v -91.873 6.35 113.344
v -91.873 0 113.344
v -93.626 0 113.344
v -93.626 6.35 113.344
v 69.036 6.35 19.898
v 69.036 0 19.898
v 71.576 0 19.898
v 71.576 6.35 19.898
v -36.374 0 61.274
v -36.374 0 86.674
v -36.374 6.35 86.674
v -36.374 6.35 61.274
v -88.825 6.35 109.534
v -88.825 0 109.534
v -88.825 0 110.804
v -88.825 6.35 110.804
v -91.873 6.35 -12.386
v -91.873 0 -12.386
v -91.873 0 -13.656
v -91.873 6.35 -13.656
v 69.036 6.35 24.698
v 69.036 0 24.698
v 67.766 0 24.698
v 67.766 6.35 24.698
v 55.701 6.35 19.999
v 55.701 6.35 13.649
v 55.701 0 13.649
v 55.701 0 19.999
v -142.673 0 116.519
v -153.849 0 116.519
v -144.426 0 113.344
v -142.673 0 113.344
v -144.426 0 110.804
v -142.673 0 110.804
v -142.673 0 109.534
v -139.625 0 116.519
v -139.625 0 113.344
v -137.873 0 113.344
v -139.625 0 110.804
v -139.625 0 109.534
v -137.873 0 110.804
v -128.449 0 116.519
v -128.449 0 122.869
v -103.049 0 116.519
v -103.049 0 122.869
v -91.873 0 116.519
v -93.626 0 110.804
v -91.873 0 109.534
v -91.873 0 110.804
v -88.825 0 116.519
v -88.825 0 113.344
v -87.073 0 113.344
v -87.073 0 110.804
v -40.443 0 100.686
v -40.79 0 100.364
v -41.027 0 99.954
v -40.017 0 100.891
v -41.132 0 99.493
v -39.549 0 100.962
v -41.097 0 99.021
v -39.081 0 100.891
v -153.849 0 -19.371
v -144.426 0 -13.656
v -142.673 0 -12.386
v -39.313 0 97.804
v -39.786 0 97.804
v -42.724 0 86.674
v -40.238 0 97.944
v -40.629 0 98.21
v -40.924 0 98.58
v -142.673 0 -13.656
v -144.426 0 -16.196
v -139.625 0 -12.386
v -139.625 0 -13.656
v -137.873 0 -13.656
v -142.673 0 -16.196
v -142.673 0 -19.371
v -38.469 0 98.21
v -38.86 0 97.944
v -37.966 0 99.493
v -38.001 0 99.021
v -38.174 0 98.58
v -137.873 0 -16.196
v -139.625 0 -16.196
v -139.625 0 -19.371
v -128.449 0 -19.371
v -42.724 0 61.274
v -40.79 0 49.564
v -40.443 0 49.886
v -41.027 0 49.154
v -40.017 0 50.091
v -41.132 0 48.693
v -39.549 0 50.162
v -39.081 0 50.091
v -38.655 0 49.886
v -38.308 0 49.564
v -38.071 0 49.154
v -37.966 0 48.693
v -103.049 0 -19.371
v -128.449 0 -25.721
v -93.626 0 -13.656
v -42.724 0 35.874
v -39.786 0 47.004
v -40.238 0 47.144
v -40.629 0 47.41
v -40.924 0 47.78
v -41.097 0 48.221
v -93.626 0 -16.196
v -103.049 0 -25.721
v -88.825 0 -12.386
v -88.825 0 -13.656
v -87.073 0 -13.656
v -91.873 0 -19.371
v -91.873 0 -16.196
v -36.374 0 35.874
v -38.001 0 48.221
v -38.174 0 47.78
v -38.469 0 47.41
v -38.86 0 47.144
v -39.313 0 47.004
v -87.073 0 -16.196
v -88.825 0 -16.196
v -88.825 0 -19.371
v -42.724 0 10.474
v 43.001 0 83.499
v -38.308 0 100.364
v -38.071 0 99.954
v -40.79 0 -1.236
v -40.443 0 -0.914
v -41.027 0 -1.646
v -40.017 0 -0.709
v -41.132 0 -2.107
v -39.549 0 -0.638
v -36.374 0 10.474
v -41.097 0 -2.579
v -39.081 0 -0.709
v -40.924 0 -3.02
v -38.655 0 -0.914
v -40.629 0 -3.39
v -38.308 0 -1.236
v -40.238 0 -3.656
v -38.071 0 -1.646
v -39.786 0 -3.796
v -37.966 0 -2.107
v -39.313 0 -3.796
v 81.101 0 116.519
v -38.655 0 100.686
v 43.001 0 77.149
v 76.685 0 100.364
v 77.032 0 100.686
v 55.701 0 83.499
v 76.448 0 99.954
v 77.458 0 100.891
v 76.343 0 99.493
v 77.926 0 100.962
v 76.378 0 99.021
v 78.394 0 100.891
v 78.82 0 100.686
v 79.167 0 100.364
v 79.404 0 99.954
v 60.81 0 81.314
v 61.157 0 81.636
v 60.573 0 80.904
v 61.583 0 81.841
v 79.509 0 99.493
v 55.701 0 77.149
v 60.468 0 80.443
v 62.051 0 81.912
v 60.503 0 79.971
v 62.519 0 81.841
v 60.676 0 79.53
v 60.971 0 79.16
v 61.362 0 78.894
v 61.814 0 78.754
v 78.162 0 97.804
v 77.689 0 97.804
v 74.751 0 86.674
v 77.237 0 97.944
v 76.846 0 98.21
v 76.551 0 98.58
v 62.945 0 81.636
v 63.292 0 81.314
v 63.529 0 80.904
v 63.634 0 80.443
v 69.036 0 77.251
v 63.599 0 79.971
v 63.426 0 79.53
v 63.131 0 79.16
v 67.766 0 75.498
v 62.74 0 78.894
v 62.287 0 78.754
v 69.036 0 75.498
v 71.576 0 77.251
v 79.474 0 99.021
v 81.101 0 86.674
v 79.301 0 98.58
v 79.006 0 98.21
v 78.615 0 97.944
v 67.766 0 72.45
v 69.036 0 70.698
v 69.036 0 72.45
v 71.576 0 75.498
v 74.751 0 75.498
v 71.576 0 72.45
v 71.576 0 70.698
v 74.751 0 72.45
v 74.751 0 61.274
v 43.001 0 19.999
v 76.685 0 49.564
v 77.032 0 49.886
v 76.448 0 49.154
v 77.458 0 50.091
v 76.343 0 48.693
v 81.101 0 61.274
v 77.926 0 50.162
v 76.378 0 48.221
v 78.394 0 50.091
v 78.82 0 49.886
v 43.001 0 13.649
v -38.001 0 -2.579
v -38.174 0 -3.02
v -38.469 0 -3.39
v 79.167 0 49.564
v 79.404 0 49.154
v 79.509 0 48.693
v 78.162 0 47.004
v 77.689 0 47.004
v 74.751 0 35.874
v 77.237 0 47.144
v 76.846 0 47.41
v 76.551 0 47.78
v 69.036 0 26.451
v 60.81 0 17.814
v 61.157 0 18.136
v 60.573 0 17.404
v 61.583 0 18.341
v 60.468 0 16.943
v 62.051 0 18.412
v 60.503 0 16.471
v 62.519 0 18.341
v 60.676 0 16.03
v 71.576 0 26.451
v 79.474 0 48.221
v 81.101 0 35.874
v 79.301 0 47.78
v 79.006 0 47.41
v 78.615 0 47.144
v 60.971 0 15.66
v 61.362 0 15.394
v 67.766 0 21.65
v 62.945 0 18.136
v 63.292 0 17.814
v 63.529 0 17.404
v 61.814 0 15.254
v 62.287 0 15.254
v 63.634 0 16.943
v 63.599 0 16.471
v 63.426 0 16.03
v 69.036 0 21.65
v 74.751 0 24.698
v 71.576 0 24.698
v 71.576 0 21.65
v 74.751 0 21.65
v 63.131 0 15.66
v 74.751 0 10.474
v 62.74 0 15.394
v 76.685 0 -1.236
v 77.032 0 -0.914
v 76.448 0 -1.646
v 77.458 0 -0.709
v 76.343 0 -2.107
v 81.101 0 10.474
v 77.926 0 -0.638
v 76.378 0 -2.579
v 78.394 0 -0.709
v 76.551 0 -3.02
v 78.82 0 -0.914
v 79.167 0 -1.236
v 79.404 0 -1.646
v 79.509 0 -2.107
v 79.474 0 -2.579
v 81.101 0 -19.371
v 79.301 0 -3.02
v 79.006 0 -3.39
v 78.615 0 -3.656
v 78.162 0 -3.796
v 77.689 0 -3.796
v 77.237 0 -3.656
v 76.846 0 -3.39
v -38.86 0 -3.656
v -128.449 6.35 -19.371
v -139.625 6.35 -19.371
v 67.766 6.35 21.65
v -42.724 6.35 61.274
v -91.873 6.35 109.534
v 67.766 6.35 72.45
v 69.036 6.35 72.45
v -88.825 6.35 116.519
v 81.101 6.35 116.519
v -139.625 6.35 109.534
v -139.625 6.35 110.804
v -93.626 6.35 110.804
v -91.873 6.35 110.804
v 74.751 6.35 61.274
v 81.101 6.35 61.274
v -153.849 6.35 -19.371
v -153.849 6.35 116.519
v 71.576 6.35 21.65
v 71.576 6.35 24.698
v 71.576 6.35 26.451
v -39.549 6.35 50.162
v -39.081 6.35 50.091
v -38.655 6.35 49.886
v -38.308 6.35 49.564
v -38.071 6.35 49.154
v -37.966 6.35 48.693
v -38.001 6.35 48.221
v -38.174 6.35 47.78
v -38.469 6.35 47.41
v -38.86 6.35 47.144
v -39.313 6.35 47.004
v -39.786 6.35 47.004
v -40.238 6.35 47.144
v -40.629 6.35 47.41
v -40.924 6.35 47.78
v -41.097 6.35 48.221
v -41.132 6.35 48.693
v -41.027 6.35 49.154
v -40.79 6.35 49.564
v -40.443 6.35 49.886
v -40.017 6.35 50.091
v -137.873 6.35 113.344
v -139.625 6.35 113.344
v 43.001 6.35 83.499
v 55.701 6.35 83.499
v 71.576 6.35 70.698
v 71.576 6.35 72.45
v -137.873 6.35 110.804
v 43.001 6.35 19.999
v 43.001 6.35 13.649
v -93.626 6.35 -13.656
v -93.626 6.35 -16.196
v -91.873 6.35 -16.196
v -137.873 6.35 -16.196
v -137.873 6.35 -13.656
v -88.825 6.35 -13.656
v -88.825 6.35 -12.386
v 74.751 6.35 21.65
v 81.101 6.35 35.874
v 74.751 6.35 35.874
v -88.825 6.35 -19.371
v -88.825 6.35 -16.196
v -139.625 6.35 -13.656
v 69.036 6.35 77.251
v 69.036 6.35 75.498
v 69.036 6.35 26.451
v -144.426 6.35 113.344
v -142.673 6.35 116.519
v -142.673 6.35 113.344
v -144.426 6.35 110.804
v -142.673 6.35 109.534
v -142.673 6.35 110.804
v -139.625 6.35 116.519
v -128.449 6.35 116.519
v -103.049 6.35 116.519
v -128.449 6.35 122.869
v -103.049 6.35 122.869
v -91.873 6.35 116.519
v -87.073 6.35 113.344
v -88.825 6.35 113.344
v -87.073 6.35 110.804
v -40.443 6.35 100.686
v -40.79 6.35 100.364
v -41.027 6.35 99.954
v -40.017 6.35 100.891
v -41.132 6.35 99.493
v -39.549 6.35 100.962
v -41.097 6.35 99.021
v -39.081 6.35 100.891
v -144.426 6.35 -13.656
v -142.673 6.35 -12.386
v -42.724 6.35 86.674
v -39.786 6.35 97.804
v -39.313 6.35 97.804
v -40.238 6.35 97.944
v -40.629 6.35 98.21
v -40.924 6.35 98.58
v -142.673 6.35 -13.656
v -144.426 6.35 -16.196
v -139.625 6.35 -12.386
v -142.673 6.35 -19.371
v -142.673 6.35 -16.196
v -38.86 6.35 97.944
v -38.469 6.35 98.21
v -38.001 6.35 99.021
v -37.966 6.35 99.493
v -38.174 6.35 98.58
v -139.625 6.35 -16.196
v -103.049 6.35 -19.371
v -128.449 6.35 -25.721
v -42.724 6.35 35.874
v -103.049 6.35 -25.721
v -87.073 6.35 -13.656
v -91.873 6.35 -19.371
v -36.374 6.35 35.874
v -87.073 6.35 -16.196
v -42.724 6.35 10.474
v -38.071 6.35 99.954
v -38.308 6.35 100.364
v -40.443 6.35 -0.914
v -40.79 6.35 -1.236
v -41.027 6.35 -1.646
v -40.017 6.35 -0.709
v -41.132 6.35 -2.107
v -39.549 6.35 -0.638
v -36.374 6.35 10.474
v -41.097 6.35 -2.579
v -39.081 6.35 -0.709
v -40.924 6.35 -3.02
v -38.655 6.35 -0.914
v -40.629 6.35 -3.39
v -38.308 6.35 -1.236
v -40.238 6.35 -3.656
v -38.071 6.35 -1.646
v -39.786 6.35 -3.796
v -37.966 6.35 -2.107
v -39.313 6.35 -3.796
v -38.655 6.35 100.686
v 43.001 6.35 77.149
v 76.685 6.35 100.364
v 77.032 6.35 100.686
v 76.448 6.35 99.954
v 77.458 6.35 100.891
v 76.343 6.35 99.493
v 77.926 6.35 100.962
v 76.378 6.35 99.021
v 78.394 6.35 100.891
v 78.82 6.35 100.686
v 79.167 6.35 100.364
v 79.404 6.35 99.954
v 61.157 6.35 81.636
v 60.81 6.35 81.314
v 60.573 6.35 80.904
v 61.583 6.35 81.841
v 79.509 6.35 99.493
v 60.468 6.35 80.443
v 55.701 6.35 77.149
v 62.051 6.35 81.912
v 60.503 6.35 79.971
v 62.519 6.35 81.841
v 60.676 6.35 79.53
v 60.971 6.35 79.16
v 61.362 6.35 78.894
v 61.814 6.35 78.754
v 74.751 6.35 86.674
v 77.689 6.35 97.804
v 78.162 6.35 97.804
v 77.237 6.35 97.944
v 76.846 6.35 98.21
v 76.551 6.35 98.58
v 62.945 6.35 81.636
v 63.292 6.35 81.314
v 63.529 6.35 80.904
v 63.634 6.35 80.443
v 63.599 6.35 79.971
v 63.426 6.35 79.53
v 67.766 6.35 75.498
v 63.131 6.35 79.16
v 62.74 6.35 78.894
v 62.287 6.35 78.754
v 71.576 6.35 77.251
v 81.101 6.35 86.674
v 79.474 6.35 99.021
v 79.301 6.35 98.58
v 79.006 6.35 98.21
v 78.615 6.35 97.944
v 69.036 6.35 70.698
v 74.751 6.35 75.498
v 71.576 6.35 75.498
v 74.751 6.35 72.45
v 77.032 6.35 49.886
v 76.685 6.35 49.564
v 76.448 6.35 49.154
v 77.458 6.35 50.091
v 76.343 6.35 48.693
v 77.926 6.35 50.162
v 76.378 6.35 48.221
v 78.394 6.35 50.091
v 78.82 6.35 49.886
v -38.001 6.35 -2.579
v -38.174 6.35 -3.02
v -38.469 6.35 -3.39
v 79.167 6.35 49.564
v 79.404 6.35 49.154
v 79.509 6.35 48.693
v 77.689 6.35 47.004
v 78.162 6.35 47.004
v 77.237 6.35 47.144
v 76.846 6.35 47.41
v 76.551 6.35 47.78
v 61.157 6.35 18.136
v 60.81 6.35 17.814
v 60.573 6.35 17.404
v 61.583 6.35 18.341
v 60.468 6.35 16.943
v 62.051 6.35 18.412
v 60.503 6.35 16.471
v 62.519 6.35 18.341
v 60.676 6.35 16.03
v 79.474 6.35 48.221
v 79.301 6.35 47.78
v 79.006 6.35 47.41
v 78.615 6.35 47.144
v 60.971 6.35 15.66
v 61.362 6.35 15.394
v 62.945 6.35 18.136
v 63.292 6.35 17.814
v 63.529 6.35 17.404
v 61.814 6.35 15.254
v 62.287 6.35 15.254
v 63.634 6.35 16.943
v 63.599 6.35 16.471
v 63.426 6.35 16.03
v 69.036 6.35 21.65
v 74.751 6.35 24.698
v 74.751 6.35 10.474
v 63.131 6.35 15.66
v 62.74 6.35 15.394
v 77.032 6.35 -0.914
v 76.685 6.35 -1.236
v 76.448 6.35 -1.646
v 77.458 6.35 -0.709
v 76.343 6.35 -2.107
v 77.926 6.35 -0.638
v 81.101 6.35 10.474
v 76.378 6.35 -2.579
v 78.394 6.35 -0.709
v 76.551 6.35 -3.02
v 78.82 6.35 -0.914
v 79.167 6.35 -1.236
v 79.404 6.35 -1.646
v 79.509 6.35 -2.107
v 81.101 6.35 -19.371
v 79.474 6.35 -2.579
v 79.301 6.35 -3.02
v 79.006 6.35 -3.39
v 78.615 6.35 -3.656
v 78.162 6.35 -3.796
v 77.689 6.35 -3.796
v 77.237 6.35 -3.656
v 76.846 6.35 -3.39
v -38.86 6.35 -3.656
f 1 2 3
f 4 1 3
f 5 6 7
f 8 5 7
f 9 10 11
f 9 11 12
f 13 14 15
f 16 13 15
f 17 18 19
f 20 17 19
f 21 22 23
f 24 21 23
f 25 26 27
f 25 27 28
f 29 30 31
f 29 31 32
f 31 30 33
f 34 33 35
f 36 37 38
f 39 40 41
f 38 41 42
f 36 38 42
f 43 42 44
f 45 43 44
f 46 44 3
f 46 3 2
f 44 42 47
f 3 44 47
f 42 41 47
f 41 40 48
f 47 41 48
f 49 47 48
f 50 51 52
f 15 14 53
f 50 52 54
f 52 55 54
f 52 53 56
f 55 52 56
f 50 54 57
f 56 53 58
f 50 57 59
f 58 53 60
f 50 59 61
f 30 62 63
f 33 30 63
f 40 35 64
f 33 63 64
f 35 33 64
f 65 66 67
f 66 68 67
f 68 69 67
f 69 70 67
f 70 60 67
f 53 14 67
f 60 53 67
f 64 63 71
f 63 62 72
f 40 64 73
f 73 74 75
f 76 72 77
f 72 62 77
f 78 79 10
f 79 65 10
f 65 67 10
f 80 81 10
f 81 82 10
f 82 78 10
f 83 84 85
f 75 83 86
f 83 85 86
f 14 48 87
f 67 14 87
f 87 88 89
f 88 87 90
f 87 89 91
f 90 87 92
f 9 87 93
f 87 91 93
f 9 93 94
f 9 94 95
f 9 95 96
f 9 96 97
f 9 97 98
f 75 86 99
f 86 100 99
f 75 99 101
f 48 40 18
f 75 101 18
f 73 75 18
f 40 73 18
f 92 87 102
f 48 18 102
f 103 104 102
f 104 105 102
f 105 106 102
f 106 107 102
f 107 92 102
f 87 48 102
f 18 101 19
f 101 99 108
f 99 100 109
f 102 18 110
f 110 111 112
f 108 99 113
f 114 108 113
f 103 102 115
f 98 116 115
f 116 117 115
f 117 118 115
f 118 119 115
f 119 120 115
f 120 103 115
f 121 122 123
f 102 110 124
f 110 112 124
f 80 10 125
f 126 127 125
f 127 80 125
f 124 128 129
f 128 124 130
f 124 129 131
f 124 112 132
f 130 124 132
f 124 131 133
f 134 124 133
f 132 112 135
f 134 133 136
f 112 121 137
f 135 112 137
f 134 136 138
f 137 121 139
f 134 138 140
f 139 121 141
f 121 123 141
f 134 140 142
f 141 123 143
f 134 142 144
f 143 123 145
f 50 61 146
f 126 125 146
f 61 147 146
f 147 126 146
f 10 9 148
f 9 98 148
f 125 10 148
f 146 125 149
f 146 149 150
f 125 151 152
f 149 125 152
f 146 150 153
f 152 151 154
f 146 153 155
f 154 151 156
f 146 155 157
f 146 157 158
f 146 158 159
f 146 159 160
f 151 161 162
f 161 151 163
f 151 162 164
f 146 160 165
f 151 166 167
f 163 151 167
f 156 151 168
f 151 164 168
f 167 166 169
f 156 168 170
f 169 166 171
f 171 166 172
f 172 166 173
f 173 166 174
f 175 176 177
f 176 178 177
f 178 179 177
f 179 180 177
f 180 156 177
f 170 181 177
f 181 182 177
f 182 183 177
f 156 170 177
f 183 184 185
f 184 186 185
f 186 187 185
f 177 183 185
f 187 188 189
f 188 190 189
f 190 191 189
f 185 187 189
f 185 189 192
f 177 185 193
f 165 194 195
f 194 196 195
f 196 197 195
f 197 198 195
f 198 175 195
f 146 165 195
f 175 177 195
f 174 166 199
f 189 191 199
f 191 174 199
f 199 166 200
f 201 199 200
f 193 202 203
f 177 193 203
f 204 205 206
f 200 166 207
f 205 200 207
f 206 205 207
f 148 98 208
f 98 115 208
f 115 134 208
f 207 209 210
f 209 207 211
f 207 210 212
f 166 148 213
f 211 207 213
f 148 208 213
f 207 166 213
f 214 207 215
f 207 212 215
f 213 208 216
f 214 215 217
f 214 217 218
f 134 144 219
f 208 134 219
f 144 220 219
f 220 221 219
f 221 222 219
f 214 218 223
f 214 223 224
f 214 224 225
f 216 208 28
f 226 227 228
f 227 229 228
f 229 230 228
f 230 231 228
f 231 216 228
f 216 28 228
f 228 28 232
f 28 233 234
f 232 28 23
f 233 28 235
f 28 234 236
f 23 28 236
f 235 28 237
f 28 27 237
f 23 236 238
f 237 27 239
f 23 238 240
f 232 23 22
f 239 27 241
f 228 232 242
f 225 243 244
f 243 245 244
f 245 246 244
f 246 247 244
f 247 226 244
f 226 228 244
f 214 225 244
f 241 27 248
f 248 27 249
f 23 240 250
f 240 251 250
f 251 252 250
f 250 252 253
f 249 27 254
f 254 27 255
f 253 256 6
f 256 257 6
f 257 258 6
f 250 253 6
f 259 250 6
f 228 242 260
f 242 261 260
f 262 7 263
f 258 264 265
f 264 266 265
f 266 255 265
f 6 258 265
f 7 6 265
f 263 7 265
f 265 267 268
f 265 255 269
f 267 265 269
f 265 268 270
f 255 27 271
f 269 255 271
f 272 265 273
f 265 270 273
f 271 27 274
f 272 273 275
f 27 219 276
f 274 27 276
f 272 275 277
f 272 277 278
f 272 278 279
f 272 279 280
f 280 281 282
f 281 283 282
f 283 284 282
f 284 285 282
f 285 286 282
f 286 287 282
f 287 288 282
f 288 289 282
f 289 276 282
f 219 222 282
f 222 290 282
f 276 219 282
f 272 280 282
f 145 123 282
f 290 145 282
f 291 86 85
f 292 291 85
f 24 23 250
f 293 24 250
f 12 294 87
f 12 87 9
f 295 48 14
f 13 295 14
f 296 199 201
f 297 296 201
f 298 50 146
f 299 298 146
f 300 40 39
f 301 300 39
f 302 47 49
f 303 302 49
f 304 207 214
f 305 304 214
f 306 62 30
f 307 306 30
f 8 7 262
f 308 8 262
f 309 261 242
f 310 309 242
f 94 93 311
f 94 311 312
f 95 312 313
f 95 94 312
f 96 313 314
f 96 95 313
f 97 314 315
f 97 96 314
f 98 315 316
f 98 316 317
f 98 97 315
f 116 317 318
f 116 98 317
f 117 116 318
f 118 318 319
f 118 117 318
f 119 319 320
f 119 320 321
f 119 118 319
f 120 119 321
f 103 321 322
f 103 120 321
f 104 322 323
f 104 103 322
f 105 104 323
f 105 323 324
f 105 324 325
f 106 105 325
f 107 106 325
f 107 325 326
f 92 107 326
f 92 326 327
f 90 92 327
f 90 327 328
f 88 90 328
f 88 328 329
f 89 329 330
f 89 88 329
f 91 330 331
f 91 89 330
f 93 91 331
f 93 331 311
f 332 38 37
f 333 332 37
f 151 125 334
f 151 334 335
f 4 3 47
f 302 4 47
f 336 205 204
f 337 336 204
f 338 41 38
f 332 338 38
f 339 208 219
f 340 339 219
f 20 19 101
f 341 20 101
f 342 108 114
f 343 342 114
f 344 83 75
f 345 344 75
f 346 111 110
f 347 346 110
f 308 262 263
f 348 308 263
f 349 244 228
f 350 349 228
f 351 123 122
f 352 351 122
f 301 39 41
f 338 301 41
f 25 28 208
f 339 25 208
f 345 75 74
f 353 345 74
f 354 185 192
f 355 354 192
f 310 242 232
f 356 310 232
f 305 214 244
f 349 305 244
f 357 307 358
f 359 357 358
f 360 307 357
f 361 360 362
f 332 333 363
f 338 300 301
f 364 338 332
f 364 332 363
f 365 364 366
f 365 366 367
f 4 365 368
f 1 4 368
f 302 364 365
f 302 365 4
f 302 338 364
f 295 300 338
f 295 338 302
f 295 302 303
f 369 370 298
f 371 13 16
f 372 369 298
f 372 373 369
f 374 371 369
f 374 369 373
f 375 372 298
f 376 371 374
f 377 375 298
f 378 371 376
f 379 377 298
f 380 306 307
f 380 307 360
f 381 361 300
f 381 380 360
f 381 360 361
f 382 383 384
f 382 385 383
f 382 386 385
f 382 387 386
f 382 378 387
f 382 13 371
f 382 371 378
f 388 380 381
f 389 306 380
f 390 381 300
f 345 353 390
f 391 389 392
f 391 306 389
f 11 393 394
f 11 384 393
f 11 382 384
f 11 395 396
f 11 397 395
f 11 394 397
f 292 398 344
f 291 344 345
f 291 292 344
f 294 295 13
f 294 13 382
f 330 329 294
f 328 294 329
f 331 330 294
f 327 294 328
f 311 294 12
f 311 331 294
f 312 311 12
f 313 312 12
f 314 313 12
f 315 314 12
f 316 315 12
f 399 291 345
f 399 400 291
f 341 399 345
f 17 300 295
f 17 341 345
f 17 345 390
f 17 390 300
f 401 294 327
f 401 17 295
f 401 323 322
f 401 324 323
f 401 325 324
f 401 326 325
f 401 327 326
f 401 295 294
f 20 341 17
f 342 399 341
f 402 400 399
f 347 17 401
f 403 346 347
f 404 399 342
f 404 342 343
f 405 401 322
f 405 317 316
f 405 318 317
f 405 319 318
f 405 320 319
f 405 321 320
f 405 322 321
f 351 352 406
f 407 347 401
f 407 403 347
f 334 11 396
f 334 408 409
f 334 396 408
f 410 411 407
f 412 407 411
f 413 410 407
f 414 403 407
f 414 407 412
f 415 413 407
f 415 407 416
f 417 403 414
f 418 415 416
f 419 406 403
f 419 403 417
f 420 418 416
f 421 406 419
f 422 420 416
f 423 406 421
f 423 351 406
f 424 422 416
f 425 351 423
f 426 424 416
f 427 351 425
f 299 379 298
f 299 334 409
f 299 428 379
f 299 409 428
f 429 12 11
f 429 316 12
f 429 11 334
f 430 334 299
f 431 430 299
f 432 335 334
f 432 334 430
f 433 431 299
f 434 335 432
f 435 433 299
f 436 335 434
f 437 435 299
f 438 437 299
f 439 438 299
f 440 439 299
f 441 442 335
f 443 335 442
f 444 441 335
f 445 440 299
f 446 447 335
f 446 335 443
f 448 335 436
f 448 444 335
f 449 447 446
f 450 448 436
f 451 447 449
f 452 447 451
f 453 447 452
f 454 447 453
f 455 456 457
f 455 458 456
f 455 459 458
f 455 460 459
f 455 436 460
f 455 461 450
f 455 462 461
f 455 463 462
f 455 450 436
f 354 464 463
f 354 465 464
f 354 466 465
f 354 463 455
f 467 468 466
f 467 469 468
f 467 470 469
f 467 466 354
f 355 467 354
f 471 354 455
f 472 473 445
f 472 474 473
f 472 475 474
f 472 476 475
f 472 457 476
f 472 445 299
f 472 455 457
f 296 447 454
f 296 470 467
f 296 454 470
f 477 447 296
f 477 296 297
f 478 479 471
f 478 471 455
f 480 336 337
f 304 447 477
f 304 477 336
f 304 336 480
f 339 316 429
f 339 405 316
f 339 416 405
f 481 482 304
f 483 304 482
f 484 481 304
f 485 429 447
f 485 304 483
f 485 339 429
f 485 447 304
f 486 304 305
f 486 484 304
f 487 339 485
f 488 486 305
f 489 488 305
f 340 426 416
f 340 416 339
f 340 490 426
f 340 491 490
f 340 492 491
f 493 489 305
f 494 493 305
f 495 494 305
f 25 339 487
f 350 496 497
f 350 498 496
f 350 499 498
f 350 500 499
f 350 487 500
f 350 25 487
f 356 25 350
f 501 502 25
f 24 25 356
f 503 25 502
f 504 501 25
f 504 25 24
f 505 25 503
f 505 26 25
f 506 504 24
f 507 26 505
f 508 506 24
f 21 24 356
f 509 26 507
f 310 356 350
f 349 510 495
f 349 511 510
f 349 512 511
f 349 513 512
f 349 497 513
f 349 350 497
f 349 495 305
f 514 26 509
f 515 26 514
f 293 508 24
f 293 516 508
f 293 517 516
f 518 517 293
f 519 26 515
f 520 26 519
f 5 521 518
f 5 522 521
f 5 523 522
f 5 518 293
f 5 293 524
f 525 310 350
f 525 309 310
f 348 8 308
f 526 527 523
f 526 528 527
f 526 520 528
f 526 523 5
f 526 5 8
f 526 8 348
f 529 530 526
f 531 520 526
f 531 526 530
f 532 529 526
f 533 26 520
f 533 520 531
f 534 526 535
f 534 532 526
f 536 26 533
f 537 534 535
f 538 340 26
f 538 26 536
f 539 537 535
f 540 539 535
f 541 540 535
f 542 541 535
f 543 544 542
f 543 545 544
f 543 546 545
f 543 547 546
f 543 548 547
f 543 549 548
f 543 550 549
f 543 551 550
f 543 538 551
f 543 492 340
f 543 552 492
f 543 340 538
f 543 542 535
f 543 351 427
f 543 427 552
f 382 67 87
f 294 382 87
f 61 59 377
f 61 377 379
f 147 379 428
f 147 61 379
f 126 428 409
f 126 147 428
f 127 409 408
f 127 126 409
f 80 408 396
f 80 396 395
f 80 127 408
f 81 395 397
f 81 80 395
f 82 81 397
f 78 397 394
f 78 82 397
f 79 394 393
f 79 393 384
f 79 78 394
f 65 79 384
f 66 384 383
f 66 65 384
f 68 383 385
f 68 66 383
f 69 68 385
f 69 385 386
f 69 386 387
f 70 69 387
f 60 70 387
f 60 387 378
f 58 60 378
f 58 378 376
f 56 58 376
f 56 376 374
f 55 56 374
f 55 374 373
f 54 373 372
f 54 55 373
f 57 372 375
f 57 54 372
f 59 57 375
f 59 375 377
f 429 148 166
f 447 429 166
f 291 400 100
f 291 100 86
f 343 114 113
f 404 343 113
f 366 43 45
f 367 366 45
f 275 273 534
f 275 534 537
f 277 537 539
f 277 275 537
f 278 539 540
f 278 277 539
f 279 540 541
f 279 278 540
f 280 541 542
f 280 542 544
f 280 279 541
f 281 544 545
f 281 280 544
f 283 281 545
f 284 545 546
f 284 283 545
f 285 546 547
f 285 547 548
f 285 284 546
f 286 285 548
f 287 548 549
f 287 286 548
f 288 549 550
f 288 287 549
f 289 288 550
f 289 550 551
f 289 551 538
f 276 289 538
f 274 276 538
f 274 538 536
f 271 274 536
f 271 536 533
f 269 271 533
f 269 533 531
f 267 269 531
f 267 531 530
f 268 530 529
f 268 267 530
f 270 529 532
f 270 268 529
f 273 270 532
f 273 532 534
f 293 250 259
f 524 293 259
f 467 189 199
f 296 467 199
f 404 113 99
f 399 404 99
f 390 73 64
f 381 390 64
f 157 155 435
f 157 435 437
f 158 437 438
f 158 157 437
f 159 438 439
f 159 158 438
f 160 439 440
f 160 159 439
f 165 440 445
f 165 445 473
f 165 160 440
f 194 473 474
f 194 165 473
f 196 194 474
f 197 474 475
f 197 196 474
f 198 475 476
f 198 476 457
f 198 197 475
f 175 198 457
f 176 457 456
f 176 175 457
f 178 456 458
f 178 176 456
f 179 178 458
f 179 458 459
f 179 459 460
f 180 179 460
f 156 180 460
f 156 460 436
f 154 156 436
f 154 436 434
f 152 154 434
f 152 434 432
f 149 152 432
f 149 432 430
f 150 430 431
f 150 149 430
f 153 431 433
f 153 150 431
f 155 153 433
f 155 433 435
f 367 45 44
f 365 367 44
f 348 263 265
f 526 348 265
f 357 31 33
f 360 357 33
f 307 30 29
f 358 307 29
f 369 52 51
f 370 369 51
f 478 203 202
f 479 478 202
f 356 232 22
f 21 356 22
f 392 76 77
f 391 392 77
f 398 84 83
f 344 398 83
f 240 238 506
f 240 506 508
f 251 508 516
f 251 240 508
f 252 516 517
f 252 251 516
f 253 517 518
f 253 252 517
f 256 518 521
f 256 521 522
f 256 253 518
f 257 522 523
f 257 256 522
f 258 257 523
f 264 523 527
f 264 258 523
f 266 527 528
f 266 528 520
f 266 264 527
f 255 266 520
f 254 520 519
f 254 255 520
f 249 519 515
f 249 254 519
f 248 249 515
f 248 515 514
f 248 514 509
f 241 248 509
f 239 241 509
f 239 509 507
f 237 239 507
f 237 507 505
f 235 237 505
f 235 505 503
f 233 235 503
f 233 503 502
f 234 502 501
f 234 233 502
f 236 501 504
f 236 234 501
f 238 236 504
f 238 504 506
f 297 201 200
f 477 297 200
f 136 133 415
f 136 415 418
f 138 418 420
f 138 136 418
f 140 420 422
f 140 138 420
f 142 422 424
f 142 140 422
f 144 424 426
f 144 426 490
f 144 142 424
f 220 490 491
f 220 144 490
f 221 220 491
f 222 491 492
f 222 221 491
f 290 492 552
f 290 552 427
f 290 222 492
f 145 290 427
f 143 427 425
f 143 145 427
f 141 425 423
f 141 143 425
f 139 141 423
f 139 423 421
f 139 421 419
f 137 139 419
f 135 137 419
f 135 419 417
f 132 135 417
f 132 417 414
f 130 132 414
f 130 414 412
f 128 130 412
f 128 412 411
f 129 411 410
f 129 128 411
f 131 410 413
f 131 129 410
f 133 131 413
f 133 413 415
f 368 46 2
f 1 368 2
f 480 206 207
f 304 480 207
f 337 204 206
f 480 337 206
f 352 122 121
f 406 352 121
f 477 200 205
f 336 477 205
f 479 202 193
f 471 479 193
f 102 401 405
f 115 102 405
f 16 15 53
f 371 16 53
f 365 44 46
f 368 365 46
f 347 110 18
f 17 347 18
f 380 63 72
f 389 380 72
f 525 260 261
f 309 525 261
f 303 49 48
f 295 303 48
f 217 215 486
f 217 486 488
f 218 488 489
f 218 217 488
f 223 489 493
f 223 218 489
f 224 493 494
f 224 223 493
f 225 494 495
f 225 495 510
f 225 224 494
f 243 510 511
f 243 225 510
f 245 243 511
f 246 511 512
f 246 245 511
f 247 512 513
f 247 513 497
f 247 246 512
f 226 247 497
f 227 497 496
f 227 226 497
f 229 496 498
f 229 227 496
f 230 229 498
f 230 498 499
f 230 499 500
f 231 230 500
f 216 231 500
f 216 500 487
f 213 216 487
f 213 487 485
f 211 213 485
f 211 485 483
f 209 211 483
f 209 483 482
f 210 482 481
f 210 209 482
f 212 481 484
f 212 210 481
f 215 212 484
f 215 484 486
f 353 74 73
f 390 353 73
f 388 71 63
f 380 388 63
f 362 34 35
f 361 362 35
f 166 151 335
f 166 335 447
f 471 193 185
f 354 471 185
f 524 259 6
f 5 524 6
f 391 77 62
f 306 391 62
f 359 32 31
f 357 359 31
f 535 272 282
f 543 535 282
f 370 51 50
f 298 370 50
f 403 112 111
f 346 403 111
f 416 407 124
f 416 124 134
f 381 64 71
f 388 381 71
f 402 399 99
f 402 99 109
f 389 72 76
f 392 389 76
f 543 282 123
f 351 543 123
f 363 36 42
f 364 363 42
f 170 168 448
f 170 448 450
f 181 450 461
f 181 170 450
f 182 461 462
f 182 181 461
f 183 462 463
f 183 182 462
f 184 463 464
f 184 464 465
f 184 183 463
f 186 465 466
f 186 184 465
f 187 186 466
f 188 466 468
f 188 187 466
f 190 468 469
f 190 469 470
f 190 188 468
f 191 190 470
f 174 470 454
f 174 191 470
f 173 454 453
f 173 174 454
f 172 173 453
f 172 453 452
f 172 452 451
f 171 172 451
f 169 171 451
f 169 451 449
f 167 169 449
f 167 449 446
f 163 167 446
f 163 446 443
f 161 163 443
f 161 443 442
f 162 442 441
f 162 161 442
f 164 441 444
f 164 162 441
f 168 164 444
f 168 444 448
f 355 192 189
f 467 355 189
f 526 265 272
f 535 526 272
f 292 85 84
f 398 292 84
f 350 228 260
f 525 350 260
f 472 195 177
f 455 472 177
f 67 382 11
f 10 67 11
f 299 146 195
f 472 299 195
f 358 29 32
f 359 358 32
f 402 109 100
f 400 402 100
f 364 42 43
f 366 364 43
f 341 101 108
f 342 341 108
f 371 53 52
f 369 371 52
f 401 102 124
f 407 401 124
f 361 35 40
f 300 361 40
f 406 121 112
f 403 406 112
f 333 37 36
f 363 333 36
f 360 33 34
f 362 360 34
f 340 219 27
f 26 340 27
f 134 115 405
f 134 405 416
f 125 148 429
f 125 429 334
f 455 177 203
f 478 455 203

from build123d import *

# Parameters (mm, degrees)
SKETCH1_R           = 1.5875
SKETCH1_W           = 6.35
SKETCH1_H           = 25.4
BOSS_EXTRUDE1_DEPTH = 6.35


with BuildPart() as part:
    # Sketch1 → Boss-Extrude1 (new body)
    with BuildSketch(Plane(origin=(0, 0, 0), x_dir=(1, 0, 0), z_dir=(0, 1, 0))):
        Polygon((-153.849110766, 19.370876928), (-153.849110766, -116.519123072), (-142.673040444, -116.519123072), (-142.673040444, -113.344123072), (-144.425640444, -113.344123072), (-144.425640444, -110.804123072), (-142.673040444, -110.804123072), (-142.673040444, -109.534123072), (-139.625181088, -109.534123072), (-139.625181088, -110.804123072), (-137.872581088, -110.804123072), (-137.872581088, -113.344123072), (-139.625181088, -113.344123072), (-139.625181088, -116.519123072), (-128.449110766, -116.519123072), (-128.449110766, -122.869123072), (-103.049110766, -122.869123072), (-103.049110766, -116.519123072), (-91.873040444, -116.519123072), (-91.873040444, -113.344123072), (-93.625640444, -113.344123072), (-93.625640444, -110.804123072), (-91.873040444, -110.804123072), (-91.873040444, -109.534123072), (-88.825181088, -109.534123072), (-88.825181088, -110.804123072), (-87.072581088, -110.804123072), (-87.072581088, -113.344123072), (-88.825181088, -113.344123072), (-88.825181088, -116.519123072), (-77.649110766, -116.519123072), (74.750889234, -116.519123072), (81.100889234, -116.519123072), (81.100889234, -86.674123072), (74.750889234, -86.674123072), (74.750889234, -75.49805275), (71.575889234, -75.49805275), (71.575889234, -77.25065275), (69.035889234, -77.25065275), (69.035889234, -75.49805275), (67.765889234, -75.49805275), (67.765889234, -72.450193394), (69.035889234, -72.450193394), (69.035889234, -70.697593394), (71.575889234, -70.697593394), (71.575889234, -72.450193394), (74.750889234, -72.450193394), (74.750889234, -61.274123072), (81.100889234, -61.274123072), (81.100889234, -35.874123072), (74.750889234, -35.874123072), (74.750889234, -24.69805275), (71.575889234, -24.69805275), (71.575889234, -26.45065275), (69.035889234, -26.45065275), (69.035889234, -24.69805275), (67.765889234, -24.69805275), (67.765889234, -21.650193394), (69.035889234, -21.650193394), (69.035889234, -19.897593394), (71.575889234, -19.897593394), (71.575889234, -21.650193394), (74.750889234, -21.650193394), (74.750889234, -10.474123072), (81.100889234, -10.474123072), (81.100889234, 19.370876928), (74.750889234, 19.370876928), (-77.649110766, 19.370876928), (-88.825181088, 19.370876928), (-88.825181088, 16.195876928), (-87.072581088, 16.195876928), (-87.072581088, 13.655876928), (-88.825181088, 13.655876928), (-88.825181088, 12.385876928), (-91.873040444, 12.385876928), (-91.873040444, 13.655876928), (-93.625640444, 13.655876928), (-93.625640444, 16.195876928), (-91.873040444, 16.195876928), (-91.873040444, 19.370876928), (-103.049110766, 19.370876928), (-103.049110766, 25.720876928), (-128.449110766, 25.720876928), (-128.449110766, 19.370876928), (-139.625181088, 19.370876928), (-139.625181088, 16.195876928), (-137.872581088, 16.195876928), (-137.872581088, 13.655876928), (-139.625181088, 13.655876928), (-139.625181088, 12.385876928), (-142.673040444, 12.385876928), (-142.673040444, 13.655876928), (-144.425640444, 13.655876928), (-144.425640444, 16.195876928), (-142.673040444, 16.195876928), (-142.673040444, 19.370876928), align=None)
        with Locations(Location((-39.549110766, 2.225876928, 0), (0, 0, 270))):
            Circle(SKETCH1_R, mode=Mode.SUBTRACT)
        with Locations(Location((-39.549110766, -48.574123072, 0), (0, 0, 270))):
            Circle(SKETCH1_R, mode=Mode.SUBTRACT)
        with Locations(Location((-39.549110766, -99.374123072, 0), (0, 0, 270))):
            Circle(SKETCH1_R, mode=Mode.SUBTRACT)
        with Locations(Location((77.925889234, 2.225876928, 0), (0, 0, 270))):
            Circle(SKETCH1_R, mode=Mode.SUBTRACT)
        with Locations(Location((77.925889234, -48.574123072, 0), (0, 0, 270))):
            Circle(SKETCH1_R, mode=Mode.SUBTRACT)
        with Locations(Location((77.925889234, -99.374123072, 0), (0, 0, 270))):
            Circle(SKETCH1_R, mode=Mode.SUBTRACT)
        with Locations(Location((62.050889234, -80.324123072, 0), (0, 0, 270))):
            Circle(SKETCH1_R, mode=Mode.SUBTRACT)
        with Locations(Location((62.050889234, -16.824123072, 0), (0, 0, 270))):
            Circle(SKETCH1_R, mode=Mode.SUBTRACT)
        with Locations((-39.549110766, -23.174123072)):
            Rectangle(SKETCH1_W, SKETCH1_H, mode=Mode.SUBTRACT)
        with Locations((-39.549110766, -73.974123072)):
            Rectangle(SKETCH1_W, SKETCH1_H, mode=Mode.SUBTRACT)
        Polygon((49.350889234, -77.149123072), (43.000889234, -77.149123072), (43.000889234, -83.499123072), (55.700889234, -83.499123072), (55.700889234, -77.149123072), align=None, mode=Mode.SUBTRACT)
        Polygon((49.350889234, -19.999123072), (43.000889234, -19.999123072), (43.000889234, -13.649123072), (55.700889234, -13.649123072), (55.700889234, -19.999123072), align=None, mode=Mode.SUBTRACT)
    extrude(amount=BOSS_EXTRUDE1_DEPTH)


solid = part.part
